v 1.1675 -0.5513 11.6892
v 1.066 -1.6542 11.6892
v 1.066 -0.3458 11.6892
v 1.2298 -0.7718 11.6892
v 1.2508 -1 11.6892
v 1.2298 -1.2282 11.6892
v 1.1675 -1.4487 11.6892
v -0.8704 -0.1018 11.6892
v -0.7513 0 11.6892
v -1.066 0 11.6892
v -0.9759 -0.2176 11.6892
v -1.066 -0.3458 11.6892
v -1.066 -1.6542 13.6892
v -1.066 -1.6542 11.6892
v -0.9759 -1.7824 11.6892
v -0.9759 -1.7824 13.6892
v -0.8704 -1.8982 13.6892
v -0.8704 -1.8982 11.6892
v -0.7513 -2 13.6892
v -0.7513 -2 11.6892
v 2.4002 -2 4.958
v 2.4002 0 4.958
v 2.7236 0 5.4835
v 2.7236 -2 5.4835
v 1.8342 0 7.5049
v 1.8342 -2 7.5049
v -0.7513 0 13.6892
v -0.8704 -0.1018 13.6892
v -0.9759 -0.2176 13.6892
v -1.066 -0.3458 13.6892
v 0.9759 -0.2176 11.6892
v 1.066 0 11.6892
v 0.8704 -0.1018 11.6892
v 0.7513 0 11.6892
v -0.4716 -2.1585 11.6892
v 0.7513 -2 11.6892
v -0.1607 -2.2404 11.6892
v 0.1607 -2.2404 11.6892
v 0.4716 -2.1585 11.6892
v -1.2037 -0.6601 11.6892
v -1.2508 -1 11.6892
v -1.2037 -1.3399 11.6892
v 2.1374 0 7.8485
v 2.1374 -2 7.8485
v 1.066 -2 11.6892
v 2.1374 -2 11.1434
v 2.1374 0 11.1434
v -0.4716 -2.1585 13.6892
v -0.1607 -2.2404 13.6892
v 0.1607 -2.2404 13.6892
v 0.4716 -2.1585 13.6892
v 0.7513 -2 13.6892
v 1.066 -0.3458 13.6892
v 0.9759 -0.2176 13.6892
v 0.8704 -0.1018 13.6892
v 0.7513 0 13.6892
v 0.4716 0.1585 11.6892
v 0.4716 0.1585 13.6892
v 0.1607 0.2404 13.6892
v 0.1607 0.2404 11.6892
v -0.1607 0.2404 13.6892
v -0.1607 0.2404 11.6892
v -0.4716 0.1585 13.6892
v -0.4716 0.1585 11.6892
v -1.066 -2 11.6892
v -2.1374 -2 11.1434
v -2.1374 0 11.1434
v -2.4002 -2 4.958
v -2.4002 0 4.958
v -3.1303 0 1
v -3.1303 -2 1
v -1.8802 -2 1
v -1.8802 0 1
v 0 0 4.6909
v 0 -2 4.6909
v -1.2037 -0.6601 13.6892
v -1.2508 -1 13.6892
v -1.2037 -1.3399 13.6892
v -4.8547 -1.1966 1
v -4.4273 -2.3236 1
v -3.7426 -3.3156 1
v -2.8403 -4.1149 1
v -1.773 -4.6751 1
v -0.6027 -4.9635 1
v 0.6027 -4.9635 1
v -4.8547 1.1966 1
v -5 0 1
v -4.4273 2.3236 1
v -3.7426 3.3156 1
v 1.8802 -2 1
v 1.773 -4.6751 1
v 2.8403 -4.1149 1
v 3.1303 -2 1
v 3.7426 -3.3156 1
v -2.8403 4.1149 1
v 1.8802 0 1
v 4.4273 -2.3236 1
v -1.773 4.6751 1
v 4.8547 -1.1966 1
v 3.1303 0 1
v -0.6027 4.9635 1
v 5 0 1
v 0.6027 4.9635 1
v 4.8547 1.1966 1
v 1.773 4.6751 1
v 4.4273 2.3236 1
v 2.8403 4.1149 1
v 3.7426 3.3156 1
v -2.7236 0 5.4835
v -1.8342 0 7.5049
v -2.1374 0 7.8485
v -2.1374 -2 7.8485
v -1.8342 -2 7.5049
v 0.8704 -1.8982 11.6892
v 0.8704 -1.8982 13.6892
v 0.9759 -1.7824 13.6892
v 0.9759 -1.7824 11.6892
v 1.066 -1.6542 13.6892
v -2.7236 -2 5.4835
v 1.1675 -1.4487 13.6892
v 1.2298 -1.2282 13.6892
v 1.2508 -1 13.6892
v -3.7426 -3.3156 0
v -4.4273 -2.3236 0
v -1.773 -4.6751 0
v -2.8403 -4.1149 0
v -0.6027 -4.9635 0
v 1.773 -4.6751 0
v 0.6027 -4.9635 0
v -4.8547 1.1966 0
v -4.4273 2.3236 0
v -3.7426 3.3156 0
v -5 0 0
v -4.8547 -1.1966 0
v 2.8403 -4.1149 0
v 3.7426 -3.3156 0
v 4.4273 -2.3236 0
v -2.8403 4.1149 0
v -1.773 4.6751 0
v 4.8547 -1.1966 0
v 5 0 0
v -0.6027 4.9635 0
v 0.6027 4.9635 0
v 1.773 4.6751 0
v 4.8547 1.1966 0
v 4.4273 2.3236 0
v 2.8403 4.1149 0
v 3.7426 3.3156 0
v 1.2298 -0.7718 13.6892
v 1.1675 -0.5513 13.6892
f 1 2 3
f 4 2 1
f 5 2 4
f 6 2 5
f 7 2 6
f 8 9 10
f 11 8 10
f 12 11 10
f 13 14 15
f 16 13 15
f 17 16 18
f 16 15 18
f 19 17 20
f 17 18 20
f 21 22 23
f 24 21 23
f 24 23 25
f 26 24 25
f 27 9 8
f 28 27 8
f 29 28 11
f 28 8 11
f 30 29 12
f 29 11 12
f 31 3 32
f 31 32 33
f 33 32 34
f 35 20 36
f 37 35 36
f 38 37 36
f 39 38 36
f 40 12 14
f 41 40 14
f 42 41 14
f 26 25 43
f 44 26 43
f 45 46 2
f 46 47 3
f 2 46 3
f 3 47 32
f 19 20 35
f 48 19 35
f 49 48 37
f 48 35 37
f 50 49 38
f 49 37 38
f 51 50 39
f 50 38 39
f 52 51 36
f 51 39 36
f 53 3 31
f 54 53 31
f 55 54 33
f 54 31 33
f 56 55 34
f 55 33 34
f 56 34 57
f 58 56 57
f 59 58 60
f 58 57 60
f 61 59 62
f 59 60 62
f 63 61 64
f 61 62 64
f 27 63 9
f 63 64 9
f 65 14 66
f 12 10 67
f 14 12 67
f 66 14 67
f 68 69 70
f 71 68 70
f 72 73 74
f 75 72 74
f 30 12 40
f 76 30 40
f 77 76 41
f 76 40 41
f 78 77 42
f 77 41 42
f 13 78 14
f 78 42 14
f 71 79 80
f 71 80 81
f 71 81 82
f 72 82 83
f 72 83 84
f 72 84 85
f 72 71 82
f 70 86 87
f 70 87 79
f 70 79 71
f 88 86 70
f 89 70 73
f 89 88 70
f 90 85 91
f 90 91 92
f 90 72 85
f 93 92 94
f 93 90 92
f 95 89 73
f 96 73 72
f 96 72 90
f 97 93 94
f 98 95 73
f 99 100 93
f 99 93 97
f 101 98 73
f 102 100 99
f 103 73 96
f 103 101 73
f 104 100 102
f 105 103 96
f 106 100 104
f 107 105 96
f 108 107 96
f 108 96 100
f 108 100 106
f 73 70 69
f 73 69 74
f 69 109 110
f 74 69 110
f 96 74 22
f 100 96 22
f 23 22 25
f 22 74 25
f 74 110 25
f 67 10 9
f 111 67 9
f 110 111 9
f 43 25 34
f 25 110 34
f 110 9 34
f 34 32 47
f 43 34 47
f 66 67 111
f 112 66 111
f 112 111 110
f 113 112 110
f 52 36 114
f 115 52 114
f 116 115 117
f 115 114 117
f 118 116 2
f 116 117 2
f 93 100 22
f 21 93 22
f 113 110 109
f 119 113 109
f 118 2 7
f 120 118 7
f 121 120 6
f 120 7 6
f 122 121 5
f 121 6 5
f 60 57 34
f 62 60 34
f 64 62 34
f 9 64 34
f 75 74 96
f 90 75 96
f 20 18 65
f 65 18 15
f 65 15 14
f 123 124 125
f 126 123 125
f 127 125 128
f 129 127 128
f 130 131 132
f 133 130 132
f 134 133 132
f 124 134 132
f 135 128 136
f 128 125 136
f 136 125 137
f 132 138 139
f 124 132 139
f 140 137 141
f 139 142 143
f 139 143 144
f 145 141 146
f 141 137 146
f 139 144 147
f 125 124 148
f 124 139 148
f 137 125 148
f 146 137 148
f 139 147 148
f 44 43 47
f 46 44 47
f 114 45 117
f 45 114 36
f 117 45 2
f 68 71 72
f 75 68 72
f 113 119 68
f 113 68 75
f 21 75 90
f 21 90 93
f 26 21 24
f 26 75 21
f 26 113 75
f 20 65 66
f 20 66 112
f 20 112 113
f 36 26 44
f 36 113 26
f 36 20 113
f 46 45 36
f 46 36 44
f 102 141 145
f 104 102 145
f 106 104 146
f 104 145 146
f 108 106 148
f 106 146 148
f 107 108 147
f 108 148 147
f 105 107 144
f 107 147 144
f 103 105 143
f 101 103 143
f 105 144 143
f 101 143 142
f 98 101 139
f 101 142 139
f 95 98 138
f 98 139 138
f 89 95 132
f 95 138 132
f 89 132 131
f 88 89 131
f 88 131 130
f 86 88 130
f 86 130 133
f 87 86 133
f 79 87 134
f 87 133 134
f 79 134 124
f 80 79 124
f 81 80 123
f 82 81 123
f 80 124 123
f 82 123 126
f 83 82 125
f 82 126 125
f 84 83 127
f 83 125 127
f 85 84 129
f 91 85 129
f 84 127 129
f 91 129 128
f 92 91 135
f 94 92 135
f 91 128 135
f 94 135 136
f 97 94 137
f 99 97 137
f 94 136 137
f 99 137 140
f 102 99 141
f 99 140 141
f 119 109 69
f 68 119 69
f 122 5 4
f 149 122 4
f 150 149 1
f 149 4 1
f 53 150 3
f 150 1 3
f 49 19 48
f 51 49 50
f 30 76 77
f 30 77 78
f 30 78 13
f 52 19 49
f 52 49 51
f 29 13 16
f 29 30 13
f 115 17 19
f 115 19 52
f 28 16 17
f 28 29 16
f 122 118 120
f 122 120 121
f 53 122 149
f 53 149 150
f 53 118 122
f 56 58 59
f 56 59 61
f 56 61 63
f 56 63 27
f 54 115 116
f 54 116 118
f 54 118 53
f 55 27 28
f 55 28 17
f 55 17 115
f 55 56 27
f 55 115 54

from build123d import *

# Parameters (mm, degrees)
F0_R     = 5
F1_DEPTH = 1
F3_DEPTH = 2
F5_DEPTH = 2


with BuildPart() as f1:
    # F0 (on Top) → F1 (new body)
    with BuildSketch(Plane.XY):
        Circle(F0_R)
    extrude(amount=F1_DEPTH)

    # F2 (on Front) → F3 (join)
    with BuildSketch(Plane.XZ):
        Polygon((-2.4001505226, 4.9579590559), (-3.1682769768, 0.7939044153), (-2.0160870627, 0.7332628593), (0, 4.6908766963), (0, 11.689173989), (-1.0660358239, 11.689173989), (-2.1373701748, 11.1433994025), (-2.1373701748, 7.848540321), (-1.8341623945, 7.5049051084), (-2.7235720772, 5.4835192859), align=None)
        Polygon((0, 11.689173989), (0, 4.6908766963), (2.0160870627, 0.7332628593), (3.1682769768, 0.7939044153), (2.4001505226, 4.9579590559), (2.7235720772, 5.4835192859), (1.8341623945, 7.5049051084), (2.1373701748, 7.848540321), (2.1373701748, 11.1433994025), (1.0660358239, 11.689173989), align=None)
    extrude(amount=F3_DEPTH)

    # F4 (on face) → F5 (join)
    with BuildSketch(Plane.XY.offset(11.689173989)):
        with BuildLine():
            Line((0.7512930037, 0), (0, 0))
            Line((0, 0), (0, -2))
            Line((0, -2), (0.7512930037, -2))
            ThreePointArc((0.7512930037, -2), (0.9249655721, -1.8419500388), (1.0660358239, -1.6542238146))
            Line((1.0660358239, -1.6542238146), (1.0660358239, -0.3457761854))
            ThreePointArc((1.0660358239, -0.3457761854), (0.9249655721, -0.1580499612), (0.7512930037, 0))
        make_face()
        with BuildLine():
            Line((-0.7512930037, 0), (0, 0))
            Line((0, 0), (0.7512930037, 0))
            ThreePointArc((0.7512930037, 0), (0, 0.25077623), (-0.7512930037, 0))
        make_face()
        with BuildLine():
            Line((0, -2), (0, 0))
            Line((0, 0), (-0.7512930037, 0))
            ThreePointArc((-0.7512930037, 0), (-0.9249655721, -0.1580499612), (-1.0660358239, -0.3457761854))
            Line((-1.0660358239, -0.3457761854), (-1.0660358239, -1.6542238146))
            ThreePointArc((-1.0660358239, -1.6542238146), (-0.9249655721, -1.8419500388), (-0.7512930037, -2))
            Line((-0.7512930037, -2), (0, -2))
        make_face()
        with BuildLine():
            Line((0.7512930037, -2), (0, -2))
            Line((0, -2), (-0.7512930037, -2))
            ThreePointArc((-0.7512930037, -2), (0, -2.25077623), (0.7512930037, -2))
        make_face()
        with BuildLine():
            ThreePointArc((1.25077623, -1), (1.2037054138, -0.6600964044), (1.0660358239, -0.3457761854))
            Line((1.0660358239, -0.3457761854), (1.0660358239, -1.6542238146))
            ThreePointArc((1.0660358239, -1.6542238146), (1.2037054138, -1.3399035956), (1.25077623, -1))
        make_face()
        with BuildLine():
            Line((-1.0660358239, -1.6542238146), (-1.0660358239, -0.3457761854))
            ThreePointArc((-1.0660358239, -0.3457761854), (-1.25077623, -1), (-1.0660358239, -1.6542238146))
        make_face()
    extrude(amount=F5_DEPTH)


solid = f1.part
